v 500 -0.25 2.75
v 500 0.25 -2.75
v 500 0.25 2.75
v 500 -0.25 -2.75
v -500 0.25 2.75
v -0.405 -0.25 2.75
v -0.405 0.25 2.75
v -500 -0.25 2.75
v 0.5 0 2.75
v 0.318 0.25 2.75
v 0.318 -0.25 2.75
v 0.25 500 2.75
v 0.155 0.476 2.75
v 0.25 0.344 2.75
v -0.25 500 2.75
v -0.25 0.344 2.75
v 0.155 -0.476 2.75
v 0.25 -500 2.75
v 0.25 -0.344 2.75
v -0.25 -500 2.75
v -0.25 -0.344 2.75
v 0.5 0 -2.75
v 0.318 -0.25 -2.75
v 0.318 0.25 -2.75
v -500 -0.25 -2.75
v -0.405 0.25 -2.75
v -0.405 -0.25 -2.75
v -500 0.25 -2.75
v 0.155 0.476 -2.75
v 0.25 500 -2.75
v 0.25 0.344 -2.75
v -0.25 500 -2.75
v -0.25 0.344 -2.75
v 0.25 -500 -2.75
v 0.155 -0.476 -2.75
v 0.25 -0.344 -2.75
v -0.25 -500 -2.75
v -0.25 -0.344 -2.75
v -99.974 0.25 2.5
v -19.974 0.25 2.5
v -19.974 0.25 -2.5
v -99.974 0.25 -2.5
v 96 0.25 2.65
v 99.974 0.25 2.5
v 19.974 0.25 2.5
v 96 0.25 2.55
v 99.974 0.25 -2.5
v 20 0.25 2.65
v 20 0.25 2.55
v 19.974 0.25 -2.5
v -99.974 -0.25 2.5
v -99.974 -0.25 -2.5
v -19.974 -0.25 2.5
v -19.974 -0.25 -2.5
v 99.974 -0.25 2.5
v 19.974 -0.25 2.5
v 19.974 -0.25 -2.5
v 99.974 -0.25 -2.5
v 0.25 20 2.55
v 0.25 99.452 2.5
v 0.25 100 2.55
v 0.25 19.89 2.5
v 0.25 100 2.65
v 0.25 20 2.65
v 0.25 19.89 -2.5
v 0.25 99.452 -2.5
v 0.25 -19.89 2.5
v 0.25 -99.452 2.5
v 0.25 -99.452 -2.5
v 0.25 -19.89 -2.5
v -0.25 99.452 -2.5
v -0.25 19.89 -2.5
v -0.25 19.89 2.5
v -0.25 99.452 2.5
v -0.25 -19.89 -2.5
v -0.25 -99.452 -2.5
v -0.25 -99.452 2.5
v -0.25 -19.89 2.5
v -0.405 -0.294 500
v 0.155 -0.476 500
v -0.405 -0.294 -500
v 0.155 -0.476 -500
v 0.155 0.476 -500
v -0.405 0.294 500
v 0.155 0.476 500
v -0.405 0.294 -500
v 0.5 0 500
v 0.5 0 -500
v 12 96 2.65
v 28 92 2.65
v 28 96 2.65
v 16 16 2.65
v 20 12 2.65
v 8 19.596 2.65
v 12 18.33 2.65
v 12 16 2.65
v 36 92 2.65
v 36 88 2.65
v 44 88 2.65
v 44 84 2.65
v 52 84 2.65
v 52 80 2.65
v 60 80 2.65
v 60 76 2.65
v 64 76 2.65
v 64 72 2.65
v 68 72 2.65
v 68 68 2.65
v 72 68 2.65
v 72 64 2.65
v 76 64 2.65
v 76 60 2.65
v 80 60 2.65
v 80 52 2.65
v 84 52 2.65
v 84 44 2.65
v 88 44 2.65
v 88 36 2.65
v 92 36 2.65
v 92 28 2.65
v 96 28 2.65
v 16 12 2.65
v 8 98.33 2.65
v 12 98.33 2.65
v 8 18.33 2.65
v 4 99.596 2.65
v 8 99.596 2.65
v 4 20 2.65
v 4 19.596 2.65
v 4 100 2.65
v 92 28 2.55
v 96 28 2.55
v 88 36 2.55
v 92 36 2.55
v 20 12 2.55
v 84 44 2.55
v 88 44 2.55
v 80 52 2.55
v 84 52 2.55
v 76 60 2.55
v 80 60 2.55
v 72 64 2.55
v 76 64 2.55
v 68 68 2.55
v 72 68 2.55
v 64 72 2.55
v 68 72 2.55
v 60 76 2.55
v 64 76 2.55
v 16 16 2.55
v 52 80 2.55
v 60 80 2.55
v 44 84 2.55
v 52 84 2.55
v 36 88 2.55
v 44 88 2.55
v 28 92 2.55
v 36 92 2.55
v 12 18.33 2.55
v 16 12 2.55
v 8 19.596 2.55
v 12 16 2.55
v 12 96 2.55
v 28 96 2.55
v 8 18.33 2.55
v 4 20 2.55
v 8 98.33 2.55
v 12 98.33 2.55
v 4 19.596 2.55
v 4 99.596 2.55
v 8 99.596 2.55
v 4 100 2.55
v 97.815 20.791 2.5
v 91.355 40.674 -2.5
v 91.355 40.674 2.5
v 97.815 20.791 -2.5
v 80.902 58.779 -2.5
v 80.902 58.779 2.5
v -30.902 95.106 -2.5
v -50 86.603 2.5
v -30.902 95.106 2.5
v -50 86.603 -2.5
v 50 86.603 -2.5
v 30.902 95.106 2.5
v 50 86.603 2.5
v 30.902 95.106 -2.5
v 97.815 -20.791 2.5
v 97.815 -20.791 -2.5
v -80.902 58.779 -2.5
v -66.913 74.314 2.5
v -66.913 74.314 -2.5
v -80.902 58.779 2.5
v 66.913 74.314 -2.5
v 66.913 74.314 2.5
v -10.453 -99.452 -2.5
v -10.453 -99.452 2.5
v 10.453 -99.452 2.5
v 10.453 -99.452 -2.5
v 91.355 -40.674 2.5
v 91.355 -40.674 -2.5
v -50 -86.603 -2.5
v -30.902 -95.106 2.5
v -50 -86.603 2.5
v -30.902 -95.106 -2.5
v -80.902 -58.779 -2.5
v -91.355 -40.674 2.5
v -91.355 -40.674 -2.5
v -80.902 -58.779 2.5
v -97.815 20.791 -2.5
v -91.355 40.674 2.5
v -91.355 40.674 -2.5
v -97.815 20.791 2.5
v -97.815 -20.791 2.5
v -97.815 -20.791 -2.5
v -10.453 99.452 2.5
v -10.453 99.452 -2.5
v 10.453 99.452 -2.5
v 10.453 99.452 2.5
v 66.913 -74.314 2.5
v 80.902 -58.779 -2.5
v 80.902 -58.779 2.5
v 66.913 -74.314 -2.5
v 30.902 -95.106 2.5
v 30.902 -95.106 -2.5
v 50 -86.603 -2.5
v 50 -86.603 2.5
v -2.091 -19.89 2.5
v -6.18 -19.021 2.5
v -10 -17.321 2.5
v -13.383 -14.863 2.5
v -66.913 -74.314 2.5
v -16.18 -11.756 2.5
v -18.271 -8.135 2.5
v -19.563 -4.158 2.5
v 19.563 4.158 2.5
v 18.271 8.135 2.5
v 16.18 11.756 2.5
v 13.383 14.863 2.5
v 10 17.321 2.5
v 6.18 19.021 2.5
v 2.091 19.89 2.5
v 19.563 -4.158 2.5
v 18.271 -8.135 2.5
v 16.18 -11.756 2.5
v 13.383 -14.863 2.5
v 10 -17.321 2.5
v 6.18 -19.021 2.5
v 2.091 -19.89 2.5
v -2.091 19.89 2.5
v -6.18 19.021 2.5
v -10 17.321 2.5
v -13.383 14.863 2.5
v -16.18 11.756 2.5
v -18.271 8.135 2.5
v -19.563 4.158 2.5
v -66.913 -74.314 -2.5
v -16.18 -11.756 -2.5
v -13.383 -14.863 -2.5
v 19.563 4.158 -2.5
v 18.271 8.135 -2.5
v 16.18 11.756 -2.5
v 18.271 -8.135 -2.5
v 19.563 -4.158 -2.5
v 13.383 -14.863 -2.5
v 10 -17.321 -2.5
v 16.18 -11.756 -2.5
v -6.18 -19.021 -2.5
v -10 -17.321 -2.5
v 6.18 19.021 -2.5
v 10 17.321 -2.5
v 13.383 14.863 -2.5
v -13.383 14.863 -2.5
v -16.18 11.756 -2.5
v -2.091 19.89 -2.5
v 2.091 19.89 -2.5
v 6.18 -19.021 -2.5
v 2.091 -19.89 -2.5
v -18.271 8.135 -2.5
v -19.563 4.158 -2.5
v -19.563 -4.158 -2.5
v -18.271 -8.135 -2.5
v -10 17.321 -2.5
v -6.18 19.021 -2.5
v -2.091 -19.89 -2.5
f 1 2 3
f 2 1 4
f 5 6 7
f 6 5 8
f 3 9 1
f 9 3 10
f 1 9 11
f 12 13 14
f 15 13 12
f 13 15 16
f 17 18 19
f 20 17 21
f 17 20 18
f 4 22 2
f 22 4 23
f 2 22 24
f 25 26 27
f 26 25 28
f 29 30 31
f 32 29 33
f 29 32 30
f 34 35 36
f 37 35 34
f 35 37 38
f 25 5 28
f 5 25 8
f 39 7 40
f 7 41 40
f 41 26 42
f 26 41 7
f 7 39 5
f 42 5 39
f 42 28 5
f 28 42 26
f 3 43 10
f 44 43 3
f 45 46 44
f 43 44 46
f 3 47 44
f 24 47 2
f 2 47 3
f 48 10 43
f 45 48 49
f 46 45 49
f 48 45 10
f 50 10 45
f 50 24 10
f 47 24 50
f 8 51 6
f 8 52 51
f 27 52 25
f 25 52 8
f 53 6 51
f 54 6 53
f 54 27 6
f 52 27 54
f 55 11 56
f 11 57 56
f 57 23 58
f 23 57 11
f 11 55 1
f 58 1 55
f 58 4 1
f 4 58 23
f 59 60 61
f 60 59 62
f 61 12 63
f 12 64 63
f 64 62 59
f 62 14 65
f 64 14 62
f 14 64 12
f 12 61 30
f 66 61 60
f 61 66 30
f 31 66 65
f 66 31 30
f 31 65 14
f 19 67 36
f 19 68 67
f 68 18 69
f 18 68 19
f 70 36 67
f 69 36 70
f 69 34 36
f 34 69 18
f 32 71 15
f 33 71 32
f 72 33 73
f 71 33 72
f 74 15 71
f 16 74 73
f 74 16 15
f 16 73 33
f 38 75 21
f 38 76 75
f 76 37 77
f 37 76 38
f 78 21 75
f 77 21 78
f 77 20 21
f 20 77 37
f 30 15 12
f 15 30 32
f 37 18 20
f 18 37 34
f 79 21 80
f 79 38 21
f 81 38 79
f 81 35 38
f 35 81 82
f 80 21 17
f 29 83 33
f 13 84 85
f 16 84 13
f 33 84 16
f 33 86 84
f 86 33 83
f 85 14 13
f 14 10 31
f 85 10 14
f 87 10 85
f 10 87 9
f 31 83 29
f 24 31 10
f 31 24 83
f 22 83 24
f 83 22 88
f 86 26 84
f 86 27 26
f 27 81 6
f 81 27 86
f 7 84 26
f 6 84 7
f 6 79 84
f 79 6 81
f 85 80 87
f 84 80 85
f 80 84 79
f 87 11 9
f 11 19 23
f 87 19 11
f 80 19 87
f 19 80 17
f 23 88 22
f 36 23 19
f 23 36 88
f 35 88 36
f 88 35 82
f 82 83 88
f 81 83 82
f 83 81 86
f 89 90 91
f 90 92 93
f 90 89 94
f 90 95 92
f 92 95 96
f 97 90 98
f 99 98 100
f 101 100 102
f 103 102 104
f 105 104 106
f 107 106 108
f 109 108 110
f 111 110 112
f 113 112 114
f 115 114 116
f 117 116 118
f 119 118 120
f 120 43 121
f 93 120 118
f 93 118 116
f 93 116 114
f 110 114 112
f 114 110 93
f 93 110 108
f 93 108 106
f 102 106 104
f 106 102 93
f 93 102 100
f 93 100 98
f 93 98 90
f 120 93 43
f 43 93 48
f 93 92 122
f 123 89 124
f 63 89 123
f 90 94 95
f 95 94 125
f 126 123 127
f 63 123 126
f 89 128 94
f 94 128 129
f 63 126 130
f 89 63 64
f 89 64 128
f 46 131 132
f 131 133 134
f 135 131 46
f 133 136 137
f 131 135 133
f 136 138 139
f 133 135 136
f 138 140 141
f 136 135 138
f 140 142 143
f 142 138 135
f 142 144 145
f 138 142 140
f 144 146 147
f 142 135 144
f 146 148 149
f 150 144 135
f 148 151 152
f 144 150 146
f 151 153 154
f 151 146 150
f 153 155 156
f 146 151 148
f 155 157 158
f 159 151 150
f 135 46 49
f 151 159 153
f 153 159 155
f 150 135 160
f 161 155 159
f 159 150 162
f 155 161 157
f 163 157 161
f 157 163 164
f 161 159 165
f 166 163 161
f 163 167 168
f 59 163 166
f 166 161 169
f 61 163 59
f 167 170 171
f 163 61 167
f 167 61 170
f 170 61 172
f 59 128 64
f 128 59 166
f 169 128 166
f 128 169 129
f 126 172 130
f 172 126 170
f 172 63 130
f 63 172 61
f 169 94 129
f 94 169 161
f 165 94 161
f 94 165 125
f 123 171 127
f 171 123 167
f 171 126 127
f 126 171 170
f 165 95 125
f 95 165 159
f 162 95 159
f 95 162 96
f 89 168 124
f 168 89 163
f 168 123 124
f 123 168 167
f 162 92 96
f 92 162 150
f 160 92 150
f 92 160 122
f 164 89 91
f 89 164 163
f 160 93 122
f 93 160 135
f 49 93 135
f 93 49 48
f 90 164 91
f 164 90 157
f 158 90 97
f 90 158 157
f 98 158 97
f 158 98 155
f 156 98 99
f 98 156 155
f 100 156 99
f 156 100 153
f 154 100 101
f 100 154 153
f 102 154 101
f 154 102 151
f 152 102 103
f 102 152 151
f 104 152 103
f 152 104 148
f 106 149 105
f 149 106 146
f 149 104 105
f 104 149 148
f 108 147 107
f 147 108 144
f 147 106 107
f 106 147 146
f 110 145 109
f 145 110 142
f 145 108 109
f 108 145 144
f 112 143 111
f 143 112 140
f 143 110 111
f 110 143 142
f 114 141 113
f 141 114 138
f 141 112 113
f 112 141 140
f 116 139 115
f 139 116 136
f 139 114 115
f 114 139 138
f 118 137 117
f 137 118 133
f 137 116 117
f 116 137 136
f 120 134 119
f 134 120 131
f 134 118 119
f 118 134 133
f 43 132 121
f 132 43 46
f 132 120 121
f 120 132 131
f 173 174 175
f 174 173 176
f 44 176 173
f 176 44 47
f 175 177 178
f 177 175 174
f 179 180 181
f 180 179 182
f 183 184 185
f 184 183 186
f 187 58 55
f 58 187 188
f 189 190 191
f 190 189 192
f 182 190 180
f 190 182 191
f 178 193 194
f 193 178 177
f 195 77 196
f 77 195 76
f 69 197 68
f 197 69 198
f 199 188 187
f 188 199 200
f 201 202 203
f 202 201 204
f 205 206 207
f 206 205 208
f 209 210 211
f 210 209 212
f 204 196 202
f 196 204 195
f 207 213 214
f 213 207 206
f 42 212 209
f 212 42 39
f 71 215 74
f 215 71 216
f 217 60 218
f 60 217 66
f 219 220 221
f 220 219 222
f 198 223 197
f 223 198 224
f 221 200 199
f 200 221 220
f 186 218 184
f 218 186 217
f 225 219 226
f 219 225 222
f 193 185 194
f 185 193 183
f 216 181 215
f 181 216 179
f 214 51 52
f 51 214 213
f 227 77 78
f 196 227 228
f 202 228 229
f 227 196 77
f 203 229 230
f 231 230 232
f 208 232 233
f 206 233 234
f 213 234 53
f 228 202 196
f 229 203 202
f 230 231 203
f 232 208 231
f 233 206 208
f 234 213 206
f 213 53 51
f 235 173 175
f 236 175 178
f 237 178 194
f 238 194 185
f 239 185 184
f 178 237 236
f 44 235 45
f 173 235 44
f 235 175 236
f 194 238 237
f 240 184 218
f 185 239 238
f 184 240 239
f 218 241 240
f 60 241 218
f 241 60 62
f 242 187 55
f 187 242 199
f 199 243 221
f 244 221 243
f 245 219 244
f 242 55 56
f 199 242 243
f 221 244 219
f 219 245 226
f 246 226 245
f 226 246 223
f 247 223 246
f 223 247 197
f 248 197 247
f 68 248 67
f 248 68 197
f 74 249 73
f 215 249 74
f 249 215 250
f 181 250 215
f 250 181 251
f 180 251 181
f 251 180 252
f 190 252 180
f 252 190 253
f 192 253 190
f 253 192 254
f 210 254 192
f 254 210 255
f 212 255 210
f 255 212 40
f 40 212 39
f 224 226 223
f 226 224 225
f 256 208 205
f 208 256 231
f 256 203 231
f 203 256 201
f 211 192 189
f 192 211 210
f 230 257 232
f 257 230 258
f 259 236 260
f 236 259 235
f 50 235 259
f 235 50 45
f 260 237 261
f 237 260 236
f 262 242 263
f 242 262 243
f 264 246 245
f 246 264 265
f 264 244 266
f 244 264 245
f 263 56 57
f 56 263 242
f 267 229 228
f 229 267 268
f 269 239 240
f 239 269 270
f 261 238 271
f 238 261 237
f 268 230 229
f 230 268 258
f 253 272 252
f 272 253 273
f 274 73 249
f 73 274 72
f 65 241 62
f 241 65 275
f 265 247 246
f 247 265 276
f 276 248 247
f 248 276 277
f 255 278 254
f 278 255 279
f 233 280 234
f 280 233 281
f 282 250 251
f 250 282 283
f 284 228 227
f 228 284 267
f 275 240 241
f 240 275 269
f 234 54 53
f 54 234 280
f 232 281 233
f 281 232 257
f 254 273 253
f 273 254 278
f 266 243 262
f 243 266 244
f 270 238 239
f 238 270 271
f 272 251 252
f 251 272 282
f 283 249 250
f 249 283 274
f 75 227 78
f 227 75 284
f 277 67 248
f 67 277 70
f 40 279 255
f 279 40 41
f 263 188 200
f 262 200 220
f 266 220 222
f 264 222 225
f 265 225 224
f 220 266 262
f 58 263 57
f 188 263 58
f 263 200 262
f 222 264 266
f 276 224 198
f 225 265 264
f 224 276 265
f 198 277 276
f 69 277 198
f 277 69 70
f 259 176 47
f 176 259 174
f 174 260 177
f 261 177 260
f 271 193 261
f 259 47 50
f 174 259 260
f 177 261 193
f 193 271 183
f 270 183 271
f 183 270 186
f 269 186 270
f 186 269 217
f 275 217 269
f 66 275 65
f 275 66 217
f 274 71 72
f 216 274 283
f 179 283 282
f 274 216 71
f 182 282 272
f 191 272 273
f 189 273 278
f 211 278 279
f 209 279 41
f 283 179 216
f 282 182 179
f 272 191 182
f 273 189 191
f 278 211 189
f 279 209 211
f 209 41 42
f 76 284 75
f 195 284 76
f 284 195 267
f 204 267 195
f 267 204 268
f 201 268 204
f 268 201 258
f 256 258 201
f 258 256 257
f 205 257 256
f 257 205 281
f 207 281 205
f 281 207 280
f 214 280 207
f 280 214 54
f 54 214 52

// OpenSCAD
/* --------- Legend ---------
Dimensions:
  Length <--> x
  Width <--> y
  Thick <--> z
*/
// Sensor Parameters
lgadWidth = 2;
circuitWidth = 2;
sensorLength = 4;
sensorThick = 0.1;
front = 1;
back = -1;
// Endcap Parameters
endcapOuterRadius = 100;
endcapInnerRadius = 20;
endcapThick = 5;


// Utility Modules
module xAxis() {
	color("Red", 0.75)
	cube([1000, 0.5, endcapThick*1.1], center=true);
}
module yAxis() {
	color("Yellow", 0.75)
	cube([0.5, 1000, endcapThick*1.1], center=true);
}
module zAxis() {
	color("Blue")
	cylinder(h=1000, d=1, center=true);
}
module axes() {
	union() {
		xAxis();
		yAxis();
		zAxis();		
	}
}
axes();

// Sensor Modules
module LGAD(x,y,face) {
	translate([x,y,(endcapThick/2+sensorThick/2)*face])
	cube([lgadWidth, sensorLength, sensorThick]);
}
module Circuitry(x,y,face) {
// Sensor
	color("LightSkyBlue", 0.75)
	translate([x,y,(endcapThick/2+sensorThick/2)*face])
	cube([circuitWidth, sensorLength, sensorThick]);	
}
module Sensor(x,y,face) {
	union() {
		Circuitry(x,y,face);
		LGAD(x+circuitWidth,y,face);
		LGAD(x+circuitWidth+lgadWidth,y,face);
		Circuitry(x+circuitWidth+lgadWidth*2,y,face);
	}
}
module SensorHalfRight(x,y,face) {
	union() {
		Circuitry(x,y,face);
		color("ForestGreen")
		LGAD(x+circuitWidth,y,face);
	}	
}
module SensorHalfLeft(x,y,face) {
	union() {
		color("DarkGreen")
		LGAD(x,y,face);
		Circuitry(x+lgadWidth,y,face);
	}	
}
// Endcap Modules
module EndcapFace(face) {
// Endcap
	translate([0, 0, (endcapThick/4)*face])
	difference() {
		cylinder(h=endcapThick/2,         // Endcap
		         d=(endcapOuterRadius*2), 
		         center=true);
		cylinder(h=(endcapThick/2+1),     // Beampipe
		         d=(endcapInnerRadius*2), 
		         center=true);
	}
}
module Endcap() {
	
// Placement Logic: get iteration range
for(inc=[0:1:endcapOuterRadius]) {
	x = inc*(lgadWidth+circuitWidth);
	yMax = pow(pow(endcapOuterRadius, 2)-pow(x+(lgadWidth+circuitWidth),2), 0.5);
	yMin = (x <= endcapInnerRadius) ? pow(pow(endcapInnerRadius, 2)-pow(x,2), 0.5) : 0;	
	if (x <= endcapOuterRadius) {
		if (x == 0) {
			for (y=[yMin:sensorLength:yMax]) {
				if (y+sensorLength <= endcapOuterRadius) {
					SensorHalfLeft(x,y,front);
				}
			}
		}
		else {
			if (inc%2 == 0) {
				for (y=[yMin:sensorLength:yMax]) {
					if (y+sensorLength <= yMax) {
						SensorHalfLeft(x,y,front);
					}
				}
			}
			else {
				for (y=[yMin:sensorLength:yMax]) {
					if (y+sensorLength <= yMax) {
						SensorHalfRight(x,y,front);
					}
				}
			}
		}		
	}

}
	union() {
		color("LightCyan")    // Front
		EndcapFace(front);
		color("LightSalmon")
		EndcapFace(back);	  // Back
	}
}

// Placement Logic: x-axis
for ([])
	
// Placement Logic: y-axis
Sensor(0,0,front);
Endcap();
